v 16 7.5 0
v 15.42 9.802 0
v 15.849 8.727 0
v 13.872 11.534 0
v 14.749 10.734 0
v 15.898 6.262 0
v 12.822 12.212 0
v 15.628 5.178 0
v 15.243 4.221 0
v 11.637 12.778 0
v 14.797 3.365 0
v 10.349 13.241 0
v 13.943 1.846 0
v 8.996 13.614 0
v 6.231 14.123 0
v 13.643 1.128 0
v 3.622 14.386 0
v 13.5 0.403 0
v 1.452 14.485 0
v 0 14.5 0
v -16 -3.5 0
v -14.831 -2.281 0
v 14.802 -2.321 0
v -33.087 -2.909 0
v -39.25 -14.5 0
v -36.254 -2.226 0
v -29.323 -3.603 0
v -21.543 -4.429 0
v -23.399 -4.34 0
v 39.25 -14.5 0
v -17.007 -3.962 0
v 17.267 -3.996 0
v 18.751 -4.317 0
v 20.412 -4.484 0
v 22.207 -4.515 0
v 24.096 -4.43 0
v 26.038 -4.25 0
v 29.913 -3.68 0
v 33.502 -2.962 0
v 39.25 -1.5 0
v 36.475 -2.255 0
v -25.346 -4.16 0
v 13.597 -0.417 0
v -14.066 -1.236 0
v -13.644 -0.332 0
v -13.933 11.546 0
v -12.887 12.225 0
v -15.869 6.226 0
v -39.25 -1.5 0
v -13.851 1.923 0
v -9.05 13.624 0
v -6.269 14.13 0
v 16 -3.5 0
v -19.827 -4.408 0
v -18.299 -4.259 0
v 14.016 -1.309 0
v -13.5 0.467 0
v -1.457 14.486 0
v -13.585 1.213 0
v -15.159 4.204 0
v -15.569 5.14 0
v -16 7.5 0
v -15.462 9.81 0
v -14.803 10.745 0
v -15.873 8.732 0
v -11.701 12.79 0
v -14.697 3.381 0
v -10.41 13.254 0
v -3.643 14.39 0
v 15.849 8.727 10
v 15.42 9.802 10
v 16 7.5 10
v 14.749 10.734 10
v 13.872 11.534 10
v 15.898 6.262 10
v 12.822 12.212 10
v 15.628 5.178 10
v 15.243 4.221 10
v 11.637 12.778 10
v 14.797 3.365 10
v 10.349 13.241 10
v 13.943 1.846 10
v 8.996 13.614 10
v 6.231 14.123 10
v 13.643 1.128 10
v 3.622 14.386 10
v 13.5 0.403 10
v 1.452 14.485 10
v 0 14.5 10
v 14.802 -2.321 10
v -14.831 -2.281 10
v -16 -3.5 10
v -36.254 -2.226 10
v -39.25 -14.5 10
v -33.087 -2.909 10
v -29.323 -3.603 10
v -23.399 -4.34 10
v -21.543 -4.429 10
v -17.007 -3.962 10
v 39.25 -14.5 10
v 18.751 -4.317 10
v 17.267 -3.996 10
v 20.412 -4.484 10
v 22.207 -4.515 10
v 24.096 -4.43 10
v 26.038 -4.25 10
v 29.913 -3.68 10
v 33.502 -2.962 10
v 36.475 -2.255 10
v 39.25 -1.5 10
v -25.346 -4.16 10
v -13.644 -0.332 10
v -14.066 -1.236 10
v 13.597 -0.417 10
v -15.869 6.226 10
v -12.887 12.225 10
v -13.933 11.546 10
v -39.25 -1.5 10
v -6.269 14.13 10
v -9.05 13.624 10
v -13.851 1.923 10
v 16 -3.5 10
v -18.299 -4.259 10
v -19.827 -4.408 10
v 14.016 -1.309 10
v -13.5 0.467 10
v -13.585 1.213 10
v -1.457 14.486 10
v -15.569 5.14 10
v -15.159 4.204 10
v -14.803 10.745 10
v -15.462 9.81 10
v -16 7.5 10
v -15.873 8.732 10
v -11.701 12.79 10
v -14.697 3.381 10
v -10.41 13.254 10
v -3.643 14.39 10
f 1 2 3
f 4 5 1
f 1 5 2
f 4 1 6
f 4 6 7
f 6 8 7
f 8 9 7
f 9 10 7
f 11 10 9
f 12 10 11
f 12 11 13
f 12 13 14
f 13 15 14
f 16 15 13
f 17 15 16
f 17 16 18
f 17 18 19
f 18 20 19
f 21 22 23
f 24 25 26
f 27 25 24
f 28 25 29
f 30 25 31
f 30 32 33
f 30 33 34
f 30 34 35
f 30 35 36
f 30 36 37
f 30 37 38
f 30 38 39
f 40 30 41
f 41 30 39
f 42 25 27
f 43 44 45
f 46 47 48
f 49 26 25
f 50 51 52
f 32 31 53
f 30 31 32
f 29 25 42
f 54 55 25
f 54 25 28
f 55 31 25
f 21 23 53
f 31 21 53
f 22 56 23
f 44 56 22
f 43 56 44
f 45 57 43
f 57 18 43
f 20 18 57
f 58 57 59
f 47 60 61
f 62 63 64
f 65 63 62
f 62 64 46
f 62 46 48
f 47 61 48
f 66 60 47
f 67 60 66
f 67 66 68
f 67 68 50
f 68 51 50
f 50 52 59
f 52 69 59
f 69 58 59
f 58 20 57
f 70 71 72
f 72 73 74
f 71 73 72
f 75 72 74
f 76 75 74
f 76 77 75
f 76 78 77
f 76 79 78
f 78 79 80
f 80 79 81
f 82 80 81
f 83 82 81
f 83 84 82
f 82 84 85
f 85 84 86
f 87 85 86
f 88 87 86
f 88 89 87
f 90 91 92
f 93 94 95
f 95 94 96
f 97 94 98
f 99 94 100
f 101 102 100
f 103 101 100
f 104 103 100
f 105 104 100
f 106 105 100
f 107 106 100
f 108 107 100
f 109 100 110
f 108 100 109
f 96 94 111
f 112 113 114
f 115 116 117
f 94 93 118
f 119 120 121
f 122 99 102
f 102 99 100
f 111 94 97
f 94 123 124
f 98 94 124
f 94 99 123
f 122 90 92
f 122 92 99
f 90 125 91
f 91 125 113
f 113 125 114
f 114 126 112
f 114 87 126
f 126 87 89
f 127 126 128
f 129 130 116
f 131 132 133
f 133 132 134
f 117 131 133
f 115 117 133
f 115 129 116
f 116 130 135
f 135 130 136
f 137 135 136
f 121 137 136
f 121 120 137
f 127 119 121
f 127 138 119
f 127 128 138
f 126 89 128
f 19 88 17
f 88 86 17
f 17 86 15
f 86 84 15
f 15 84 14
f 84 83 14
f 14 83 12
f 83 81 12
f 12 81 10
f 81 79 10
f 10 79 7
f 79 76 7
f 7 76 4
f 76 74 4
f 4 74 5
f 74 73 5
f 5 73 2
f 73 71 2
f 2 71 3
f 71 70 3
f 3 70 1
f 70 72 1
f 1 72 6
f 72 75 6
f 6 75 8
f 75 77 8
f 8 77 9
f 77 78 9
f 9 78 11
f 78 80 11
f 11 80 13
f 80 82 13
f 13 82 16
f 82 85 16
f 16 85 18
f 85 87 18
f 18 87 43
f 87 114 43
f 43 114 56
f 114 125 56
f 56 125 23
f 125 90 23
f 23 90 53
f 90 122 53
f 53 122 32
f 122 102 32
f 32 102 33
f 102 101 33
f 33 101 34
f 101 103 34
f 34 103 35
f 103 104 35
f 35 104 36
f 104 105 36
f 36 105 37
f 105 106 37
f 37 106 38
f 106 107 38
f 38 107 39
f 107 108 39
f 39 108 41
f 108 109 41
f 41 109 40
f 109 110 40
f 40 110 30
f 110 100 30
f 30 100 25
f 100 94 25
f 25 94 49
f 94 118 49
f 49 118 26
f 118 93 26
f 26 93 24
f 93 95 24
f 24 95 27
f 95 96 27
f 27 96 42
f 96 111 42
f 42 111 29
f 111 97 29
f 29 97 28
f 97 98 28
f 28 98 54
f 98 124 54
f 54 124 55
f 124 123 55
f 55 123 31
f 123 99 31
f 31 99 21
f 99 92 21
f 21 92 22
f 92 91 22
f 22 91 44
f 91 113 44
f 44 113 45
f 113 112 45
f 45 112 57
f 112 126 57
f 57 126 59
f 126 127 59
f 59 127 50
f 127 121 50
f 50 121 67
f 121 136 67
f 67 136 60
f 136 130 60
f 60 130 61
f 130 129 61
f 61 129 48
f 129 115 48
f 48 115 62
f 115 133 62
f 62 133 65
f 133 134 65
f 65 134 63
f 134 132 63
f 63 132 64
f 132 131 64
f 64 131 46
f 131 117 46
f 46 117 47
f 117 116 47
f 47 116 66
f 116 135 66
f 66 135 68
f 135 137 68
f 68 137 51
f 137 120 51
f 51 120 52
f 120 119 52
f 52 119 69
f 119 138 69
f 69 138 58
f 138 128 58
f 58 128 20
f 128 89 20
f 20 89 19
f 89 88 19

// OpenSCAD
// Module names are of the form poly_<inkscape-path-id>().  As a result,
// you can associate a polygon in this OpenSCAD program with the corresponding
// SVG element in the Inkscape document by looking for the XML element with
// the attribute id="inkscape-path-id".

// fudge value is used to ensure that subtracted solids are a tad taller
// in the z dimension than the polygon being subtracted from.  This helps
// keep the resulting .stl file manifold.
fudge = 0.1;

module poly_path2995(h)
{
  scale([25.4/90, -25.4/90, 1]) union()
  {
    linear_extrude(height=h)
      polygon([[-139.074800,5.314975],[-139.074800,51.377975],[139.074800,51.377975],[139.074800,5.314975],[129.243110,7.989761],[118.709556,10.496291],[105.991802,13.038288],[92.260556,15.057783],[85.380718,15.697227],[78.686522,15.996808],[72.324305,15.886779],[66.440406,15.297395],[61.181162,14.158909],[56.692913,12.401575],[52.447246,8.222870],[49.661635,4.637313],[48.177096,1.476686],[47.834646,-1.427225],[48.339963,-3.997711],[49.402865,-6.540009],[52.430234,-11.923825],[54.009107,-14.957235],[55.374376,-18.346241],[56.333245,-22.186789],[56.692915,-26.574825],[56.156214,-30.922990],[54.637419,-34.730757],[52.261074,-38.033984],[49.151726,-40.868529],[45.433920,-43.270248],[41.232204,-45.275000],[36.671121,-46.918643],[31.875219,-48.237032],[22.077139,-50.041486],[12.834331,-50.975220],[5.143162,-51.325096],[0.000000,-51.377975],[-5.164312,-51.329326],[-12.906846,-50.989723],[-22.213104,-50.068678],[-32.068591,-48.275706],[-36.885265,-46.961471],[-41.458811,-45.320321],[-45.662416,-43.315947],[-49.369269,-40.912037],[-52.452557,-38.072280],[-54.785468,-34.760367],[-56.241191,-30.939985],[-56.692913,-26.574825],[-56.227725,-22.060295],[-55.164934,-18.211228],[-53.711615,-14.894797],[-52.074840,-11.978175],[-49.079216,-6.813047],[-48.134513,-4.298886],[-47.834646,-1.653225],[-48.343905,1.177211],[-49.841646,4.381288],[-52.550454,8.081808],[-56.692913,12.401575],[-60.261777,14.040075],[-64.838631,15.090360],[-70.252622,15.619007],[-76.332894,15.692594],[-82.908592,15.377697],[-89.808861,14.740893],[-103.899689,12.767875],[-117.238538,10.306157],[-128.458567,7.888356],[-139.074800,5.314975]]);
  }
}

poly_path2995(10);
